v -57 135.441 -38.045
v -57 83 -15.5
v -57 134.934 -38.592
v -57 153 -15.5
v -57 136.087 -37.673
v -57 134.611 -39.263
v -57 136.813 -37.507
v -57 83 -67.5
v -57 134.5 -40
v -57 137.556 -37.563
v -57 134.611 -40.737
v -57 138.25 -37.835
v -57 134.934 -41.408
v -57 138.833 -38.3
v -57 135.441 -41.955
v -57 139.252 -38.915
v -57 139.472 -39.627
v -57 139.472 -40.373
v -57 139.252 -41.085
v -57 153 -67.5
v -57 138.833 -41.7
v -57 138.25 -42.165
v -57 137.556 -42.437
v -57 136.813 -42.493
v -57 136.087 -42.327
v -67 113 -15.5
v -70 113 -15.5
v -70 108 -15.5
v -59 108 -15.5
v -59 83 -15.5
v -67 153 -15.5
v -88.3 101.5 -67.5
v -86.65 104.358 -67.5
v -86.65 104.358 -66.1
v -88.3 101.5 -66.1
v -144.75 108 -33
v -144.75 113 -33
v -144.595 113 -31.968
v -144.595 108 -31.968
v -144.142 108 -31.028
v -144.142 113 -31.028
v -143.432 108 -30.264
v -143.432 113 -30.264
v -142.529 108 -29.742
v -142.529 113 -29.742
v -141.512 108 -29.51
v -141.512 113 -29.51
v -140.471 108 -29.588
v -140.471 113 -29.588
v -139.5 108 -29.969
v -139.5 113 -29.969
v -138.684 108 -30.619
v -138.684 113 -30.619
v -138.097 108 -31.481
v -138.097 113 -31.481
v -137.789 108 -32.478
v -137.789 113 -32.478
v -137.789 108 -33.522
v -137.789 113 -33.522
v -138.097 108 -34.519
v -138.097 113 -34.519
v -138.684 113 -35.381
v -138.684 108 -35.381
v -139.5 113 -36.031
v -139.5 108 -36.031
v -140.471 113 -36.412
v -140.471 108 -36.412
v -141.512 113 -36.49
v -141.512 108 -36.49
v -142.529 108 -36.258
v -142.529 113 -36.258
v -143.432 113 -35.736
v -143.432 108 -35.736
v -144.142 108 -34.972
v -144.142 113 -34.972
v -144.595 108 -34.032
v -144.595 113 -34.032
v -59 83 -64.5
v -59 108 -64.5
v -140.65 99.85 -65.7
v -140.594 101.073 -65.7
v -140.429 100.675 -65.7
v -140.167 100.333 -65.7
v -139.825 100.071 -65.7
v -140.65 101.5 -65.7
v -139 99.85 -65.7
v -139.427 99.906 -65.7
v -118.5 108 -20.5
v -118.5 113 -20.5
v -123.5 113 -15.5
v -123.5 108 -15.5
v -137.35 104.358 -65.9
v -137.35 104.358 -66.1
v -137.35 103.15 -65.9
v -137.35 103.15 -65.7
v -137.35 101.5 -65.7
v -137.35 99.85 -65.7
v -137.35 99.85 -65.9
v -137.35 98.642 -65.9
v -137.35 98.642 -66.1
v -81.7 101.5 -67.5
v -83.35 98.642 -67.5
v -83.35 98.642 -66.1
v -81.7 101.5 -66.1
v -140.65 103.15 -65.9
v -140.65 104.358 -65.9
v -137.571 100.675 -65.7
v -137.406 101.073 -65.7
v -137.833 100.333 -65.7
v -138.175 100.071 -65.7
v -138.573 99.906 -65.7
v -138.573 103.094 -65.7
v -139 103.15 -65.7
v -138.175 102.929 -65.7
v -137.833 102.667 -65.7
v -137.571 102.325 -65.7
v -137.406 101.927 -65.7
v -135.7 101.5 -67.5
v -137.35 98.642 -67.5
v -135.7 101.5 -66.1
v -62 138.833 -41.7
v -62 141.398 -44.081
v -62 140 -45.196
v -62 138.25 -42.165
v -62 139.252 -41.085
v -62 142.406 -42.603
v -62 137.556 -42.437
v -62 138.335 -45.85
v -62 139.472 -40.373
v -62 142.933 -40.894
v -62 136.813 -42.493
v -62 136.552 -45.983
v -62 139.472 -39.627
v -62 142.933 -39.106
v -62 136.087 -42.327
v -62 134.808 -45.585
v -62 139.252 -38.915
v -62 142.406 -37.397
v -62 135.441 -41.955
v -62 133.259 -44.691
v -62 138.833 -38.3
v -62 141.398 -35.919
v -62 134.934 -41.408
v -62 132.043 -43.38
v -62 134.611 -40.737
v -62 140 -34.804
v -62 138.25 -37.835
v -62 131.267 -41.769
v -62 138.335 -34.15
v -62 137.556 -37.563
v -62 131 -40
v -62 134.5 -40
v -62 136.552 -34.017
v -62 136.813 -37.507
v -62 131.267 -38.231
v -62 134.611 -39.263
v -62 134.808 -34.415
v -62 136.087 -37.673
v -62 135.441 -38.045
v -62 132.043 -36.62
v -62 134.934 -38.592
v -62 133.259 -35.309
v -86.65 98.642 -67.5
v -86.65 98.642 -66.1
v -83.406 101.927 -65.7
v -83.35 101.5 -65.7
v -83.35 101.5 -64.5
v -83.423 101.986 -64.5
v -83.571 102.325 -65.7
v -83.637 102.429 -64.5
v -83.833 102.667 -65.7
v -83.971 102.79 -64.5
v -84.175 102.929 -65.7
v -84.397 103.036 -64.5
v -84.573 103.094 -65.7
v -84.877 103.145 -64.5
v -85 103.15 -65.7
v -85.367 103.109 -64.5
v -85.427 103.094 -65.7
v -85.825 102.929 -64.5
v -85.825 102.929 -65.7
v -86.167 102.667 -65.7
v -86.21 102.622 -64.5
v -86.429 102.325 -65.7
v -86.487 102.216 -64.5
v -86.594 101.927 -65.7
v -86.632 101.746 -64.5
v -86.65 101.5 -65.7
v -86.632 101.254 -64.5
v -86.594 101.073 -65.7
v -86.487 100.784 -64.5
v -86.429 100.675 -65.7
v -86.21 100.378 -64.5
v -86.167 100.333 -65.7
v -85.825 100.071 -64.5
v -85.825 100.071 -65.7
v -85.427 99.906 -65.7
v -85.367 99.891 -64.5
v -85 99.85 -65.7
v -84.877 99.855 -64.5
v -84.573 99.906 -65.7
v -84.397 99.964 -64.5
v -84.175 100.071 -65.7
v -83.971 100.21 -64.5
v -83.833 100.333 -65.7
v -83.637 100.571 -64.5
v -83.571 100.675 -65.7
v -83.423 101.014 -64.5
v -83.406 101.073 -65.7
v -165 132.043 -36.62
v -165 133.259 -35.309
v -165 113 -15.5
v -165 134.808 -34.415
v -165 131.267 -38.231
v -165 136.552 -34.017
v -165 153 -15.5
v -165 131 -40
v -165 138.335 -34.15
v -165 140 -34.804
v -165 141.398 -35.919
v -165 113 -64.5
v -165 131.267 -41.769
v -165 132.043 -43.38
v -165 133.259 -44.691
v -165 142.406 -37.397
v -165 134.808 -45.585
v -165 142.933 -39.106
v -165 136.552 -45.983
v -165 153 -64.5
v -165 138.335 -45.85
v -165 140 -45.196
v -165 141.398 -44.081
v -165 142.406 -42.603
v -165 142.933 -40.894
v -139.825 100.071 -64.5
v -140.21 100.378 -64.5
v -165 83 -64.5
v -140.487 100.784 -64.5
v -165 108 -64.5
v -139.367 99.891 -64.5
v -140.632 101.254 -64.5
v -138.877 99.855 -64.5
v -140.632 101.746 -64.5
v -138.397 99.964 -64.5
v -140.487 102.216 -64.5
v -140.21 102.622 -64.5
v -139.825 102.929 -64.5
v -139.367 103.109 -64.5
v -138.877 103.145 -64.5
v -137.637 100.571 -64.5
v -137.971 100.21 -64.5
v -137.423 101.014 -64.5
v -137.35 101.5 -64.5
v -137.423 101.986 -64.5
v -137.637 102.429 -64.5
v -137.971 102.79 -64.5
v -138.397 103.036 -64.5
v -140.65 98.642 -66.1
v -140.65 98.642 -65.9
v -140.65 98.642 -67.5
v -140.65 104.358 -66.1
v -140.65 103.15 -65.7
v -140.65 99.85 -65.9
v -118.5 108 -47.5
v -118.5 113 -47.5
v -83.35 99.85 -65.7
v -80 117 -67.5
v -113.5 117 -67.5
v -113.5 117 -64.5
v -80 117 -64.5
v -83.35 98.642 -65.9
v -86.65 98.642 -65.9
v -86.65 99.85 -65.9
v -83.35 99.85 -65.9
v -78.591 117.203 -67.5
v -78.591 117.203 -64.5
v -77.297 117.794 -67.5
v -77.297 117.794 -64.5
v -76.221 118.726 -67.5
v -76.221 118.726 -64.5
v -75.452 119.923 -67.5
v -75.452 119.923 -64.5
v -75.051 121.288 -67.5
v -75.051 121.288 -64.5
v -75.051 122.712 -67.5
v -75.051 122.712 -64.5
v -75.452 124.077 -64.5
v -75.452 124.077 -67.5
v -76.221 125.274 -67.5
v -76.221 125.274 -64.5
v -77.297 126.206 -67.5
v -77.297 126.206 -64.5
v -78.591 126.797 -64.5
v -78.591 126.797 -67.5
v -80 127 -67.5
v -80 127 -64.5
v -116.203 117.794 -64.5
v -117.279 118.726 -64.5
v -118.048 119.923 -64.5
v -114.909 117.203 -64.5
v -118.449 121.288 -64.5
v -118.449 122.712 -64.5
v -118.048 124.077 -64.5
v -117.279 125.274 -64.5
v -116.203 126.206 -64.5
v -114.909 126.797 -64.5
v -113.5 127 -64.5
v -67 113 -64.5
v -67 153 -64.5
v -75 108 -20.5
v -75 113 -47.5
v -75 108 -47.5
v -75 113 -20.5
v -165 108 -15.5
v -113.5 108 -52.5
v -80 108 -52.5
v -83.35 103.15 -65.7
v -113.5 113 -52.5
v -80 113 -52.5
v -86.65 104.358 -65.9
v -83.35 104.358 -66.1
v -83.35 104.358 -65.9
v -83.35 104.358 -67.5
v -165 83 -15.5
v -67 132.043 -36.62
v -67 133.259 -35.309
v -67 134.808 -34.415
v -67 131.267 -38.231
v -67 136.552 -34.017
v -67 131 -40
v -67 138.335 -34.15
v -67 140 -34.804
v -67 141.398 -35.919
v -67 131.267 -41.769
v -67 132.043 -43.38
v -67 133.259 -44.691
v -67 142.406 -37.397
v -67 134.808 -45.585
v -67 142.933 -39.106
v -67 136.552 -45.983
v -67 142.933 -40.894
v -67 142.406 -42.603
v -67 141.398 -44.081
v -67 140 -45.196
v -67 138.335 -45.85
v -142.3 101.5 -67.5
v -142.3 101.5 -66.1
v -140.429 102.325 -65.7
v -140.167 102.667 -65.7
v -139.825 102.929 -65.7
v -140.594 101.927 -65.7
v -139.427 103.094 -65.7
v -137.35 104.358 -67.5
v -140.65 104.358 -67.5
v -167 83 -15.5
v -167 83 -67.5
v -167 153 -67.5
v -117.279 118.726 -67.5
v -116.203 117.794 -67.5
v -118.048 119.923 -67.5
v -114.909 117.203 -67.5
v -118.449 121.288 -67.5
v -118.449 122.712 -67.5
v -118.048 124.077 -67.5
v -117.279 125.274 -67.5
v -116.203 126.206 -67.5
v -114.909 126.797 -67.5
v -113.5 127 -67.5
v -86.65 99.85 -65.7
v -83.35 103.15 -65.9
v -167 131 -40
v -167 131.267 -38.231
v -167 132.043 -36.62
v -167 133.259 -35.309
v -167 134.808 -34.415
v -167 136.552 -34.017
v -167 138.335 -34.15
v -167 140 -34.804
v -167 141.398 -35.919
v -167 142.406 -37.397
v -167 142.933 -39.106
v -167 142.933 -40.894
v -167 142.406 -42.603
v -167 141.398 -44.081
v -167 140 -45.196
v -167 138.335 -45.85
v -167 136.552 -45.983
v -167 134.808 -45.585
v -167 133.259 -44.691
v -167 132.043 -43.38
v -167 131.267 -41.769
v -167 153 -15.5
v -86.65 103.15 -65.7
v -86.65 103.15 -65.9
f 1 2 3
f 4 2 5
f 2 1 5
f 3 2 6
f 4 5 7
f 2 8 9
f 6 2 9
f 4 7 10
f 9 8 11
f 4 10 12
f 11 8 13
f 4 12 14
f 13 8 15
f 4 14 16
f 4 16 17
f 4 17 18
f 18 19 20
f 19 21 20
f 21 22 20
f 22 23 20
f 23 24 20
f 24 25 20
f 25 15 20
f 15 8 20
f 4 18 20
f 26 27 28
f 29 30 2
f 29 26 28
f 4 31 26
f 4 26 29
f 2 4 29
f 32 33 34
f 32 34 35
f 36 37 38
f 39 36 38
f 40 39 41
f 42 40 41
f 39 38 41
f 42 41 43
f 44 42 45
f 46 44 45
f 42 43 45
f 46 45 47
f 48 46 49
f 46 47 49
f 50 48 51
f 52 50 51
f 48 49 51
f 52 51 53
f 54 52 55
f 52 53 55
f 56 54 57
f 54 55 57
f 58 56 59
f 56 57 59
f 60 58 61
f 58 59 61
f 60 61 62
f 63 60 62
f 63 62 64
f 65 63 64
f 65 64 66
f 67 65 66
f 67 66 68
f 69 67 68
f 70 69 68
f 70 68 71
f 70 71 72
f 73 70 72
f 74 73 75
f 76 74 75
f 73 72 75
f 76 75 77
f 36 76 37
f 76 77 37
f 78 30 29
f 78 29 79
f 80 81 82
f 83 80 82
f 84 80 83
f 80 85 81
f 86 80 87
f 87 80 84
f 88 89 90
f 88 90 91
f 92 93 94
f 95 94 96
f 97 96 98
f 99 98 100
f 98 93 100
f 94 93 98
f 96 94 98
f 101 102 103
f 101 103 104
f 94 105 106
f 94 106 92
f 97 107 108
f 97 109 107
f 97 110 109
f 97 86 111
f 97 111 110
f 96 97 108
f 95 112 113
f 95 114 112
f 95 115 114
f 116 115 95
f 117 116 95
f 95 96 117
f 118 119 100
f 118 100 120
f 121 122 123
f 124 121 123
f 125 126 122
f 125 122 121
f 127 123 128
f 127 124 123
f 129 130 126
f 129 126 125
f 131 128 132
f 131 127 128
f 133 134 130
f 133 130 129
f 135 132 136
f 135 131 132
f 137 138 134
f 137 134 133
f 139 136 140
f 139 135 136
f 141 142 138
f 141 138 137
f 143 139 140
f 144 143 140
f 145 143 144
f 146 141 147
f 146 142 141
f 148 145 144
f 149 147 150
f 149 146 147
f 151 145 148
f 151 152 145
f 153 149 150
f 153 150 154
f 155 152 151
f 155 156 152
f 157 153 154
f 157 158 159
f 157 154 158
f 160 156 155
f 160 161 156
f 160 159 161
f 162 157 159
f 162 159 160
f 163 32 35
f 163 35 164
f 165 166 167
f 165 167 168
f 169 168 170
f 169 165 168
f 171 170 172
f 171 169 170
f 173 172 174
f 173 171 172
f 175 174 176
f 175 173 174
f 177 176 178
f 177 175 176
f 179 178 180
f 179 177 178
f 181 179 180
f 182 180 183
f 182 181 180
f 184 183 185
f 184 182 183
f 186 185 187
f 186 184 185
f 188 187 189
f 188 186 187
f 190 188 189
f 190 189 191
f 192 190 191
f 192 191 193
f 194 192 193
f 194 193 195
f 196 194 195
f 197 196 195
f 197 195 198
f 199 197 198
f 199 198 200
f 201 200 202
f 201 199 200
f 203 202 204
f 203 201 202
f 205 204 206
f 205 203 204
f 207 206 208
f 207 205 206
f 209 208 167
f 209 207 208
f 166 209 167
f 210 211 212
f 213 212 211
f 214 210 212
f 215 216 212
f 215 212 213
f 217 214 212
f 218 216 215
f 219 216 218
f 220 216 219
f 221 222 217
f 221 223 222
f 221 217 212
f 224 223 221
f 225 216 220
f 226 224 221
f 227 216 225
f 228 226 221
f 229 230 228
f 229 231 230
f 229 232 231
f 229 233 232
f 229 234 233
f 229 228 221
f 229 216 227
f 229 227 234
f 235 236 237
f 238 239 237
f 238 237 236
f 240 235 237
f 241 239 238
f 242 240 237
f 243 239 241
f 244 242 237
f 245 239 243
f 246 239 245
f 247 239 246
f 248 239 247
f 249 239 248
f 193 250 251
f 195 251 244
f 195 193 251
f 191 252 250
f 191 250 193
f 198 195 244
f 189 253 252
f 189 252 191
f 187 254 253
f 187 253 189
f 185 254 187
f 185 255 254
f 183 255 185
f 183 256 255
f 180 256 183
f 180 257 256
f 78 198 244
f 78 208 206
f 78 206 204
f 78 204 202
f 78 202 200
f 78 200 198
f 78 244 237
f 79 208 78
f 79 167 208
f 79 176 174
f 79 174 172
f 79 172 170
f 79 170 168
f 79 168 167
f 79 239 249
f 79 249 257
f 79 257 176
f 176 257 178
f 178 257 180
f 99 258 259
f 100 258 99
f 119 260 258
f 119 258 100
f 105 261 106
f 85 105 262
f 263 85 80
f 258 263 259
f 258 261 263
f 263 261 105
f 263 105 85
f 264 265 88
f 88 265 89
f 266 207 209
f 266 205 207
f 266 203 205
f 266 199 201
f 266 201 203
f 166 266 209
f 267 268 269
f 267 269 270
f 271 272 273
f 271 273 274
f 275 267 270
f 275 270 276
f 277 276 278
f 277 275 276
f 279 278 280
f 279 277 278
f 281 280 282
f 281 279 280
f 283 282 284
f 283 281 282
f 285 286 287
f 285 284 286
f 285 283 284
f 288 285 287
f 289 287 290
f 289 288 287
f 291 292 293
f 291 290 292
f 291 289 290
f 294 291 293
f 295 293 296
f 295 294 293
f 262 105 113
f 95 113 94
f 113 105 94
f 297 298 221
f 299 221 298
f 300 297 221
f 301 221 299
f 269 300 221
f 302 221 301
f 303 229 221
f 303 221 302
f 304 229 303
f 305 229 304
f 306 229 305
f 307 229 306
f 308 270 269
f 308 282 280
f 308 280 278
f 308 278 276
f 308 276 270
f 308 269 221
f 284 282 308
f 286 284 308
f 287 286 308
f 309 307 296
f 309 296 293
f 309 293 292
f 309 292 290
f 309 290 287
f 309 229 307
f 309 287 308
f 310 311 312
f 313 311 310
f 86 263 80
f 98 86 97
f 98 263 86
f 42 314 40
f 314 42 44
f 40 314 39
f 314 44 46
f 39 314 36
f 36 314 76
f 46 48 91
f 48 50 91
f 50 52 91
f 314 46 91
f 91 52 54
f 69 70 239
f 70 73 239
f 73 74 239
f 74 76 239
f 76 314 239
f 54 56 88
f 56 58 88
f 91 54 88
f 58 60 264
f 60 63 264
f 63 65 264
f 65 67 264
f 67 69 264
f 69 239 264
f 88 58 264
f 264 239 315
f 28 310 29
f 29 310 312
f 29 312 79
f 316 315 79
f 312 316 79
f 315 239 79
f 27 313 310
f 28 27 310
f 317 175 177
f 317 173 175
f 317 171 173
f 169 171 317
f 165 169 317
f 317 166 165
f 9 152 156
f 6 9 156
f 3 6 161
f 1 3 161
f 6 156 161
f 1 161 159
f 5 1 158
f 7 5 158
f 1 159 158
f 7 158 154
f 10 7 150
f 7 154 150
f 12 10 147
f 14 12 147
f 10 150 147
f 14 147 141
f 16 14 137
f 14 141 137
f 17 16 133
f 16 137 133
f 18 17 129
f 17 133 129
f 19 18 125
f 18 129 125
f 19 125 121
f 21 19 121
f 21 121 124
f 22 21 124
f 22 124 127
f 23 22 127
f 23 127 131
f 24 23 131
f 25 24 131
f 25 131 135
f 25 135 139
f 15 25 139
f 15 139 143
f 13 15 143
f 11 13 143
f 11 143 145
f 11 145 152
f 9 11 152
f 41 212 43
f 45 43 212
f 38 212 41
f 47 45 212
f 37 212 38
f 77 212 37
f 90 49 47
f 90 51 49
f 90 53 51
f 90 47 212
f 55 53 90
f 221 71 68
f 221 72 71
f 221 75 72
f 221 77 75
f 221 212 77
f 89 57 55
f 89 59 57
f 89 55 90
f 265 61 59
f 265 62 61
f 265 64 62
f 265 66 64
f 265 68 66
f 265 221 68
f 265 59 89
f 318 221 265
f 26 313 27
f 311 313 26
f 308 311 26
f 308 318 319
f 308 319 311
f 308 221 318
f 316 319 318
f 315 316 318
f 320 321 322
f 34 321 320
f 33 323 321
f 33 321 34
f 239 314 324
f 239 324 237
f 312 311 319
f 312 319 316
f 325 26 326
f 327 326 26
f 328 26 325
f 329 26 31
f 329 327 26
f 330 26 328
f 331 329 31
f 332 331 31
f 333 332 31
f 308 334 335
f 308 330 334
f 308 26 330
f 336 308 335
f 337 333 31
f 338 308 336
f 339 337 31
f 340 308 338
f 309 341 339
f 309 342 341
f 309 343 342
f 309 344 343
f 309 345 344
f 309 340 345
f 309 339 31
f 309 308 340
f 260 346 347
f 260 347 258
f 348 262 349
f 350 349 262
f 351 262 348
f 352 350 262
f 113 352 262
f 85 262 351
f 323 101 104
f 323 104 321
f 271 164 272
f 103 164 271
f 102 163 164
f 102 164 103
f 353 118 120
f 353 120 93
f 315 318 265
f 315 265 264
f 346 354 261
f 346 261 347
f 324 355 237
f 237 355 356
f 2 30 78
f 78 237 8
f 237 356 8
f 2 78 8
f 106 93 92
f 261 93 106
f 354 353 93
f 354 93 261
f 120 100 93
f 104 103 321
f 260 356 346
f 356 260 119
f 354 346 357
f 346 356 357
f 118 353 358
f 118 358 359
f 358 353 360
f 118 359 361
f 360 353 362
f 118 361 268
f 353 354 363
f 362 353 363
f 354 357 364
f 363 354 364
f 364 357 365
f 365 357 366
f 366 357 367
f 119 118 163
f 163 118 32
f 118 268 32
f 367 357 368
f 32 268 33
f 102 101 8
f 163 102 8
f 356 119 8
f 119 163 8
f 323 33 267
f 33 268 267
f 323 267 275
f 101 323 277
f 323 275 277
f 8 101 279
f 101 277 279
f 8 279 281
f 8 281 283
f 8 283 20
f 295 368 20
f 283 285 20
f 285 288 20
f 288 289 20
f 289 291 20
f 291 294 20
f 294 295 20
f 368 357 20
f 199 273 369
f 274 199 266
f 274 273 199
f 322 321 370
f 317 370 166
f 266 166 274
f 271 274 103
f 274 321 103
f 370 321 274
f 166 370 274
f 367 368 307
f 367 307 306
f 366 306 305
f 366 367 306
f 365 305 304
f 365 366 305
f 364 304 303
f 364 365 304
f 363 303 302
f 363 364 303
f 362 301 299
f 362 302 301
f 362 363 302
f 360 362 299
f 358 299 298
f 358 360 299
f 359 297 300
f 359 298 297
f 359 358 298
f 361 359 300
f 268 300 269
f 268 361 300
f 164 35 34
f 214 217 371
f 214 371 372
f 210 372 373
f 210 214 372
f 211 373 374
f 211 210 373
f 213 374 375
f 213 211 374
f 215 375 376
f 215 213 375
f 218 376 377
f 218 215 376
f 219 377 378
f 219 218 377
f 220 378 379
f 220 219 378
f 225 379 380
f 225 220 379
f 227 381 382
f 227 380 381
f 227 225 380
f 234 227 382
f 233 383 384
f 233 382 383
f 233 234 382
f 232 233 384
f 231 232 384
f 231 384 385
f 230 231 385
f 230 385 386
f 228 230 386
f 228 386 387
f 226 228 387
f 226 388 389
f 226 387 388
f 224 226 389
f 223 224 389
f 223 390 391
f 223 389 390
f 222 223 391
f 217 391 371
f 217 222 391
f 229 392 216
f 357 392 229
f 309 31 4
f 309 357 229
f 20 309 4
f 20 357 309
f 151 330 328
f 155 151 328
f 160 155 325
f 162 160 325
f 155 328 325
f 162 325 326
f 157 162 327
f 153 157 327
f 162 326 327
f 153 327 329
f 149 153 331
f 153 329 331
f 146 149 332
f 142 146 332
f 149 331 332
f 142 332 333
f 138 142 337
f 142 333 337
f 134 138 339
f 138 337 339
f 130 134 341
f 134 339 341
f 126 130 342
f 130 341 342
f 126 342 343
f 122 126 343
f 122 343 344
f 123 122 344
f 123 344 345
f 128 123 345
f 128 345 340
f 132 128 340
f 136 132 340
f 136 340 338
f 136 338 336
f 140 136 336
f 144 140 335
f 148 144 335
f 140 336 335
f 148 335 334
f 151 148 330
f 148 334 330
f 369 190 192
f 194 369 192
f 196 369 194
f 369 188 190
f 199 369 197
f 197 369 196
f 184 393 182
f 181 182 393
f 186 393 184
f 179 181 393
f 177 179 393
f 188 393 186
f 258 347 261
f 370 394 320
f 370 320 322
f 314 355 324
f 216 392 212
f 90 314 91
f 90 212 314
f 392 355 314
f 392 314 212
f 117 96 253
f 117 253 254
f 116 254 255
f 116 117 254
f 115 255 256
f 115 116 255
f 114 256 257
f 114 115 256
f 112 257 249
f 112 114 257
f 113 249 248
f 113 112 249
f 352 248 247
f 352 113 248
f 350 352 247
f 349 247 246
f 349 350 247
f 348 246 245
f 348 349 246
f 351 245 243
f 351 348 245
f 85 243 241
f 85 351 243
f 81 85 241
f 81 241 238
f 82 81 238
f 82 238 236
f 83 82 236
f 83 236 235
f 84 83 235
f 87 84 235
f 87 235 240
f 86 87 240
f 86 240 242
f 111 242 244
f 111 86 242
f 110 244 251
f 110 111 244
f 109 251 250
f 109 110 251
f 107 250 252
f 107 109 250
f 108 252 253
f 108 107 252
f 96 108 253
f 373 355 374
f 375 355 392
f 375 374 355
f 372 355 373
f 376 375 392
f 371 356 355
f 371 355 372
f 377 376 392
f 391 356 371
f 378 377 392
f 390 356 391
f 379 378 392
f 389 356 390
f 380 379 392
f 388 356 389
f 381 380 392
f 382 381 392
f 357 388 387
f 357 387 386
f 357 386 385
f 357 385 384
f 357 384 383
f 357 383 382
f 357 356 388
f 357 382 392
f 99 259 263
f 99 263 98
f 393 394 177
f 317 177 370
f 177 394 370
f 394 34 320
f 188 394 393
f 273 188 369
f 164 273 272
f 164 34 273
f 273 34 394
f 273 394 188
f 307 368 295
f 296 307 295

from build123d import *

# Parameters (mm, degrees)
SKETCH_W             = 110
SKETCH_H             = 70
PAD_DEPTH            = 3
SKETCH001_W          = 2
SKETCH001_H          = 52
PAD001_DEPTH         = 35
SKETCH002_W          = 10
SKETCH002_H          = 45
PAD002_DEPTH         = 52
SKETCH003_W          = 110
SKETCH003_H          = 5
PAD003_DEPTH         = 52
SKETCH004_R          = 3.5
SKETCH004_W          = 43.5
SKETCH004_H          = 37
POCKET_DEPTH         = 5
SKETCH005_R          = 2.5
POCKET001_DEPTH      = 10
SKETCH006_R          = 6
POCKET002_DEPTH      = 5
SKETCH011_R          = 6
POCKET003_DEPTH      = 150
SKETCH007_R          = 1.65
POCKET004_DEPTH      = 5
POCKET005_DEPTH      = 1.4
SKETCH009_W          = 3.3
SKETCH009_H          = 5.715768
POCKET006_DEPTH      = 0.2
SKETCH010_W          = 3.3
SKETCH010_H          = 3.3
POCKET007_DEPTH      = 0.2
CHAMFER_SIZE         = 5
POCKET012_DEPTH      = 5
BODY_PLACEMENT_ANGLE = 90


with BuildPart() as part:
    # Sketch → Pad (new body)
    with BuildSketch(Plane.XZ):
        Rectangle(SKETCH_W, SKETCH_H)
    extrude(amount=PAD_DEPTH)

    # Sketch001 → Pad001 (join, symmetric)
    with BuildSketch(Plane.XY):
        with Locations((54, -26)):
            Rectangle(SKETCH001_W, SKETCH001_H)
        with Locations((-54, -26)):
            Rectangle(SKETCH001_W, SKETCH001_H)
    extrude(amount=PAD001_DEPTH, both=True)

    # Sketch002 → Pad002 (join)
    with BuildSketch(Plane.XZ):
        with Locations((50, 12.5)):
            Rectangle(SKETCH002_W, SKETCH002_H)
    extrude(amount=PAD002_DEPTH)

    # Sketch003 → Pad003 (join)
    with BuildSketch(Plane.XZ):
        with Locations((0, -7.5)):
            Rectangle(SKETCH003_W, SKETCH003_H)
    extrude(amount=PAD003_DEPTH)

    # Sketch004 (on Face19 of Pad003) → Pocket (cut)
    with BuildSketch(Plane(origin=(0, 0, -5), x_dir=(-1, 0, 0), z_dir=(0, 0, 1))):
        with Locations((29.25, 34.5)):
            Circle(SKETCH004_R)
        with Locations((-15.25, 33.5)):
            Rectangle(SKETCH004_W, SKETCH004_H)
    extrude(amount=-POCKET_DEPTH, mode=Mode.SUBTRACT)

    # Sketch005 (on Face20 of Pocket) → Pocket001 (cut)
    with BuildSketch(Plane(origin=(45, 0, 0), x_dir=(0, 0, -1), z_dir=(-1, 0, 0))):
        with Locations((-19, 27.5)):
            Circle(SKETCH005_R)
    extrude(amount=-POCKET001_DEPTH, mode=Mode.SUBTRACT)

    # Sketch006 (on Face20 of Pocket001) → Pocket002 (cut)
    with BuildSketch(Plane(origin=(45, 0, 0), x_dir=(0, 0, -1), z_dir=(-1, 0, 0))):
        with Locations((-19, 27.5)):
            Circle(SKETCH006_R)
    extrude(amount=-POCKET002_DEPTH, mode=Mode.SUBTRACT)

    # Sketch011 (on Face20 of Pocket002) → Pocket003 (cut)
    with BuildSketch(Plane(origin=(45, 0, 0), x_dir=(0, 0, -1), z_dir=(-1, 0, 0))):
        with Locations((-19, 27.5)):
            Circle(SKETCH011_R)
    extrude(amount=POCKET003_DEPTH, mode=Mode.SUBTRACT)

    # Sketch007 → Pocket004 (cut)
    with BuildSketch(Plane.XZ):
        with Locations((-27, -16.5)):
            Circle(SKETCH007_R)
        with Locations((27, -16.5)):
            Circle(SKETCH007_R)
    extrude(amount=POCKET004_DEPTH, mode=Mode.SUBTRACT)

    # Sketch008 → Pocket005 (cut)
    with BuildSketch(Plane.XZ):
        Polygon((-25.35, -13.642116), (-28.65, -13.642116), (-30.3, -16.5), (-28.65, -19.357884), (-25.35, -19.357884), (-23.7, -16.5), align=None)
        Polygon((30.3, -16.5), (28.65, -13.642116), (25.35, -13.642116), (23.7, -16.5), (25.35, -19.357884), (28.65, -19.357884), align=None)
    extrude(amount=POCKET005_DEPTH, mode=Mode.SUBTRACT)

    # Sketch009 (on Face67 of Pocket005) → Pocket006 (cut)
    with BuildSketch(Plane(origin=(0, -1.4, 0), x_dir=(1, 0, 0), z_dir=(0, 1, 0))):
        with Locations((-27, 16.5)):
            Rectangle(SKETCH009_W, SKETCH009_H)
        with Locations((27, 16.5)):
            Rectangle(SKETCH009_W, SKETCH009_H)
    extrude(amount=-POCKET006_DEPTH, mode=Mode.SUBTRACT)

    # Sketch010 (on Face95 of Pocket006) → Pocket007 (cut)
    with BuildSketch(Plane(origin=(0, -1.6, 0), x_dir=(1, 0, 0), z_dir=(0, 1, 0))):
        with Locations((27, 16.5)):
            Rectangle(SKETCH010_W, SKETCH010_H)
        with Locations((-27, 16.5)):
            Rectangle(SKETCH010_W, SKETCH010_H)
    extrude(amount=-POCKET007_DEPTH, mode=Mode.SUBTRACT)

    # Chamfer
    chamfer_edges = [part.edges().sort_by_distance(p)[0] for p in [
        (-6.5, -52, -7.5),
        (37, -52, -7.5),
        (-6.5, -15, -7.5),
        (37, -15, -7.5),
    ]]
    chamfer(chamfer_edges, length=CHAMFER_SIZE)

    # Sketch018 → Pocket012 (cut)
    with BuildSketch(Plane.XZ):
        with BuildLine():
            ThreePointArc((-1.5, 9), (-6.5, 4), (-1.5, -1))
            Line((-1.5, -1), (32, -1))
            ThreePointArc((32, -1), (37, 4), (32, 9))
            Line((-1.5, 9), (32, 9))
        make_face()
    extrude(amount=POCKET012_DEPTH, mode=Mode.SUBTRACT)


with BuildPart() as part_1:
    # Body placement: moved
    add(part.part.moved(Location((-112, 118, -67.5))).rotate(Axis((-112, 118, -67.5), (-1, 0, 0)), BODY_PLACEMENT_ANGLE))


solid = part_1.part
